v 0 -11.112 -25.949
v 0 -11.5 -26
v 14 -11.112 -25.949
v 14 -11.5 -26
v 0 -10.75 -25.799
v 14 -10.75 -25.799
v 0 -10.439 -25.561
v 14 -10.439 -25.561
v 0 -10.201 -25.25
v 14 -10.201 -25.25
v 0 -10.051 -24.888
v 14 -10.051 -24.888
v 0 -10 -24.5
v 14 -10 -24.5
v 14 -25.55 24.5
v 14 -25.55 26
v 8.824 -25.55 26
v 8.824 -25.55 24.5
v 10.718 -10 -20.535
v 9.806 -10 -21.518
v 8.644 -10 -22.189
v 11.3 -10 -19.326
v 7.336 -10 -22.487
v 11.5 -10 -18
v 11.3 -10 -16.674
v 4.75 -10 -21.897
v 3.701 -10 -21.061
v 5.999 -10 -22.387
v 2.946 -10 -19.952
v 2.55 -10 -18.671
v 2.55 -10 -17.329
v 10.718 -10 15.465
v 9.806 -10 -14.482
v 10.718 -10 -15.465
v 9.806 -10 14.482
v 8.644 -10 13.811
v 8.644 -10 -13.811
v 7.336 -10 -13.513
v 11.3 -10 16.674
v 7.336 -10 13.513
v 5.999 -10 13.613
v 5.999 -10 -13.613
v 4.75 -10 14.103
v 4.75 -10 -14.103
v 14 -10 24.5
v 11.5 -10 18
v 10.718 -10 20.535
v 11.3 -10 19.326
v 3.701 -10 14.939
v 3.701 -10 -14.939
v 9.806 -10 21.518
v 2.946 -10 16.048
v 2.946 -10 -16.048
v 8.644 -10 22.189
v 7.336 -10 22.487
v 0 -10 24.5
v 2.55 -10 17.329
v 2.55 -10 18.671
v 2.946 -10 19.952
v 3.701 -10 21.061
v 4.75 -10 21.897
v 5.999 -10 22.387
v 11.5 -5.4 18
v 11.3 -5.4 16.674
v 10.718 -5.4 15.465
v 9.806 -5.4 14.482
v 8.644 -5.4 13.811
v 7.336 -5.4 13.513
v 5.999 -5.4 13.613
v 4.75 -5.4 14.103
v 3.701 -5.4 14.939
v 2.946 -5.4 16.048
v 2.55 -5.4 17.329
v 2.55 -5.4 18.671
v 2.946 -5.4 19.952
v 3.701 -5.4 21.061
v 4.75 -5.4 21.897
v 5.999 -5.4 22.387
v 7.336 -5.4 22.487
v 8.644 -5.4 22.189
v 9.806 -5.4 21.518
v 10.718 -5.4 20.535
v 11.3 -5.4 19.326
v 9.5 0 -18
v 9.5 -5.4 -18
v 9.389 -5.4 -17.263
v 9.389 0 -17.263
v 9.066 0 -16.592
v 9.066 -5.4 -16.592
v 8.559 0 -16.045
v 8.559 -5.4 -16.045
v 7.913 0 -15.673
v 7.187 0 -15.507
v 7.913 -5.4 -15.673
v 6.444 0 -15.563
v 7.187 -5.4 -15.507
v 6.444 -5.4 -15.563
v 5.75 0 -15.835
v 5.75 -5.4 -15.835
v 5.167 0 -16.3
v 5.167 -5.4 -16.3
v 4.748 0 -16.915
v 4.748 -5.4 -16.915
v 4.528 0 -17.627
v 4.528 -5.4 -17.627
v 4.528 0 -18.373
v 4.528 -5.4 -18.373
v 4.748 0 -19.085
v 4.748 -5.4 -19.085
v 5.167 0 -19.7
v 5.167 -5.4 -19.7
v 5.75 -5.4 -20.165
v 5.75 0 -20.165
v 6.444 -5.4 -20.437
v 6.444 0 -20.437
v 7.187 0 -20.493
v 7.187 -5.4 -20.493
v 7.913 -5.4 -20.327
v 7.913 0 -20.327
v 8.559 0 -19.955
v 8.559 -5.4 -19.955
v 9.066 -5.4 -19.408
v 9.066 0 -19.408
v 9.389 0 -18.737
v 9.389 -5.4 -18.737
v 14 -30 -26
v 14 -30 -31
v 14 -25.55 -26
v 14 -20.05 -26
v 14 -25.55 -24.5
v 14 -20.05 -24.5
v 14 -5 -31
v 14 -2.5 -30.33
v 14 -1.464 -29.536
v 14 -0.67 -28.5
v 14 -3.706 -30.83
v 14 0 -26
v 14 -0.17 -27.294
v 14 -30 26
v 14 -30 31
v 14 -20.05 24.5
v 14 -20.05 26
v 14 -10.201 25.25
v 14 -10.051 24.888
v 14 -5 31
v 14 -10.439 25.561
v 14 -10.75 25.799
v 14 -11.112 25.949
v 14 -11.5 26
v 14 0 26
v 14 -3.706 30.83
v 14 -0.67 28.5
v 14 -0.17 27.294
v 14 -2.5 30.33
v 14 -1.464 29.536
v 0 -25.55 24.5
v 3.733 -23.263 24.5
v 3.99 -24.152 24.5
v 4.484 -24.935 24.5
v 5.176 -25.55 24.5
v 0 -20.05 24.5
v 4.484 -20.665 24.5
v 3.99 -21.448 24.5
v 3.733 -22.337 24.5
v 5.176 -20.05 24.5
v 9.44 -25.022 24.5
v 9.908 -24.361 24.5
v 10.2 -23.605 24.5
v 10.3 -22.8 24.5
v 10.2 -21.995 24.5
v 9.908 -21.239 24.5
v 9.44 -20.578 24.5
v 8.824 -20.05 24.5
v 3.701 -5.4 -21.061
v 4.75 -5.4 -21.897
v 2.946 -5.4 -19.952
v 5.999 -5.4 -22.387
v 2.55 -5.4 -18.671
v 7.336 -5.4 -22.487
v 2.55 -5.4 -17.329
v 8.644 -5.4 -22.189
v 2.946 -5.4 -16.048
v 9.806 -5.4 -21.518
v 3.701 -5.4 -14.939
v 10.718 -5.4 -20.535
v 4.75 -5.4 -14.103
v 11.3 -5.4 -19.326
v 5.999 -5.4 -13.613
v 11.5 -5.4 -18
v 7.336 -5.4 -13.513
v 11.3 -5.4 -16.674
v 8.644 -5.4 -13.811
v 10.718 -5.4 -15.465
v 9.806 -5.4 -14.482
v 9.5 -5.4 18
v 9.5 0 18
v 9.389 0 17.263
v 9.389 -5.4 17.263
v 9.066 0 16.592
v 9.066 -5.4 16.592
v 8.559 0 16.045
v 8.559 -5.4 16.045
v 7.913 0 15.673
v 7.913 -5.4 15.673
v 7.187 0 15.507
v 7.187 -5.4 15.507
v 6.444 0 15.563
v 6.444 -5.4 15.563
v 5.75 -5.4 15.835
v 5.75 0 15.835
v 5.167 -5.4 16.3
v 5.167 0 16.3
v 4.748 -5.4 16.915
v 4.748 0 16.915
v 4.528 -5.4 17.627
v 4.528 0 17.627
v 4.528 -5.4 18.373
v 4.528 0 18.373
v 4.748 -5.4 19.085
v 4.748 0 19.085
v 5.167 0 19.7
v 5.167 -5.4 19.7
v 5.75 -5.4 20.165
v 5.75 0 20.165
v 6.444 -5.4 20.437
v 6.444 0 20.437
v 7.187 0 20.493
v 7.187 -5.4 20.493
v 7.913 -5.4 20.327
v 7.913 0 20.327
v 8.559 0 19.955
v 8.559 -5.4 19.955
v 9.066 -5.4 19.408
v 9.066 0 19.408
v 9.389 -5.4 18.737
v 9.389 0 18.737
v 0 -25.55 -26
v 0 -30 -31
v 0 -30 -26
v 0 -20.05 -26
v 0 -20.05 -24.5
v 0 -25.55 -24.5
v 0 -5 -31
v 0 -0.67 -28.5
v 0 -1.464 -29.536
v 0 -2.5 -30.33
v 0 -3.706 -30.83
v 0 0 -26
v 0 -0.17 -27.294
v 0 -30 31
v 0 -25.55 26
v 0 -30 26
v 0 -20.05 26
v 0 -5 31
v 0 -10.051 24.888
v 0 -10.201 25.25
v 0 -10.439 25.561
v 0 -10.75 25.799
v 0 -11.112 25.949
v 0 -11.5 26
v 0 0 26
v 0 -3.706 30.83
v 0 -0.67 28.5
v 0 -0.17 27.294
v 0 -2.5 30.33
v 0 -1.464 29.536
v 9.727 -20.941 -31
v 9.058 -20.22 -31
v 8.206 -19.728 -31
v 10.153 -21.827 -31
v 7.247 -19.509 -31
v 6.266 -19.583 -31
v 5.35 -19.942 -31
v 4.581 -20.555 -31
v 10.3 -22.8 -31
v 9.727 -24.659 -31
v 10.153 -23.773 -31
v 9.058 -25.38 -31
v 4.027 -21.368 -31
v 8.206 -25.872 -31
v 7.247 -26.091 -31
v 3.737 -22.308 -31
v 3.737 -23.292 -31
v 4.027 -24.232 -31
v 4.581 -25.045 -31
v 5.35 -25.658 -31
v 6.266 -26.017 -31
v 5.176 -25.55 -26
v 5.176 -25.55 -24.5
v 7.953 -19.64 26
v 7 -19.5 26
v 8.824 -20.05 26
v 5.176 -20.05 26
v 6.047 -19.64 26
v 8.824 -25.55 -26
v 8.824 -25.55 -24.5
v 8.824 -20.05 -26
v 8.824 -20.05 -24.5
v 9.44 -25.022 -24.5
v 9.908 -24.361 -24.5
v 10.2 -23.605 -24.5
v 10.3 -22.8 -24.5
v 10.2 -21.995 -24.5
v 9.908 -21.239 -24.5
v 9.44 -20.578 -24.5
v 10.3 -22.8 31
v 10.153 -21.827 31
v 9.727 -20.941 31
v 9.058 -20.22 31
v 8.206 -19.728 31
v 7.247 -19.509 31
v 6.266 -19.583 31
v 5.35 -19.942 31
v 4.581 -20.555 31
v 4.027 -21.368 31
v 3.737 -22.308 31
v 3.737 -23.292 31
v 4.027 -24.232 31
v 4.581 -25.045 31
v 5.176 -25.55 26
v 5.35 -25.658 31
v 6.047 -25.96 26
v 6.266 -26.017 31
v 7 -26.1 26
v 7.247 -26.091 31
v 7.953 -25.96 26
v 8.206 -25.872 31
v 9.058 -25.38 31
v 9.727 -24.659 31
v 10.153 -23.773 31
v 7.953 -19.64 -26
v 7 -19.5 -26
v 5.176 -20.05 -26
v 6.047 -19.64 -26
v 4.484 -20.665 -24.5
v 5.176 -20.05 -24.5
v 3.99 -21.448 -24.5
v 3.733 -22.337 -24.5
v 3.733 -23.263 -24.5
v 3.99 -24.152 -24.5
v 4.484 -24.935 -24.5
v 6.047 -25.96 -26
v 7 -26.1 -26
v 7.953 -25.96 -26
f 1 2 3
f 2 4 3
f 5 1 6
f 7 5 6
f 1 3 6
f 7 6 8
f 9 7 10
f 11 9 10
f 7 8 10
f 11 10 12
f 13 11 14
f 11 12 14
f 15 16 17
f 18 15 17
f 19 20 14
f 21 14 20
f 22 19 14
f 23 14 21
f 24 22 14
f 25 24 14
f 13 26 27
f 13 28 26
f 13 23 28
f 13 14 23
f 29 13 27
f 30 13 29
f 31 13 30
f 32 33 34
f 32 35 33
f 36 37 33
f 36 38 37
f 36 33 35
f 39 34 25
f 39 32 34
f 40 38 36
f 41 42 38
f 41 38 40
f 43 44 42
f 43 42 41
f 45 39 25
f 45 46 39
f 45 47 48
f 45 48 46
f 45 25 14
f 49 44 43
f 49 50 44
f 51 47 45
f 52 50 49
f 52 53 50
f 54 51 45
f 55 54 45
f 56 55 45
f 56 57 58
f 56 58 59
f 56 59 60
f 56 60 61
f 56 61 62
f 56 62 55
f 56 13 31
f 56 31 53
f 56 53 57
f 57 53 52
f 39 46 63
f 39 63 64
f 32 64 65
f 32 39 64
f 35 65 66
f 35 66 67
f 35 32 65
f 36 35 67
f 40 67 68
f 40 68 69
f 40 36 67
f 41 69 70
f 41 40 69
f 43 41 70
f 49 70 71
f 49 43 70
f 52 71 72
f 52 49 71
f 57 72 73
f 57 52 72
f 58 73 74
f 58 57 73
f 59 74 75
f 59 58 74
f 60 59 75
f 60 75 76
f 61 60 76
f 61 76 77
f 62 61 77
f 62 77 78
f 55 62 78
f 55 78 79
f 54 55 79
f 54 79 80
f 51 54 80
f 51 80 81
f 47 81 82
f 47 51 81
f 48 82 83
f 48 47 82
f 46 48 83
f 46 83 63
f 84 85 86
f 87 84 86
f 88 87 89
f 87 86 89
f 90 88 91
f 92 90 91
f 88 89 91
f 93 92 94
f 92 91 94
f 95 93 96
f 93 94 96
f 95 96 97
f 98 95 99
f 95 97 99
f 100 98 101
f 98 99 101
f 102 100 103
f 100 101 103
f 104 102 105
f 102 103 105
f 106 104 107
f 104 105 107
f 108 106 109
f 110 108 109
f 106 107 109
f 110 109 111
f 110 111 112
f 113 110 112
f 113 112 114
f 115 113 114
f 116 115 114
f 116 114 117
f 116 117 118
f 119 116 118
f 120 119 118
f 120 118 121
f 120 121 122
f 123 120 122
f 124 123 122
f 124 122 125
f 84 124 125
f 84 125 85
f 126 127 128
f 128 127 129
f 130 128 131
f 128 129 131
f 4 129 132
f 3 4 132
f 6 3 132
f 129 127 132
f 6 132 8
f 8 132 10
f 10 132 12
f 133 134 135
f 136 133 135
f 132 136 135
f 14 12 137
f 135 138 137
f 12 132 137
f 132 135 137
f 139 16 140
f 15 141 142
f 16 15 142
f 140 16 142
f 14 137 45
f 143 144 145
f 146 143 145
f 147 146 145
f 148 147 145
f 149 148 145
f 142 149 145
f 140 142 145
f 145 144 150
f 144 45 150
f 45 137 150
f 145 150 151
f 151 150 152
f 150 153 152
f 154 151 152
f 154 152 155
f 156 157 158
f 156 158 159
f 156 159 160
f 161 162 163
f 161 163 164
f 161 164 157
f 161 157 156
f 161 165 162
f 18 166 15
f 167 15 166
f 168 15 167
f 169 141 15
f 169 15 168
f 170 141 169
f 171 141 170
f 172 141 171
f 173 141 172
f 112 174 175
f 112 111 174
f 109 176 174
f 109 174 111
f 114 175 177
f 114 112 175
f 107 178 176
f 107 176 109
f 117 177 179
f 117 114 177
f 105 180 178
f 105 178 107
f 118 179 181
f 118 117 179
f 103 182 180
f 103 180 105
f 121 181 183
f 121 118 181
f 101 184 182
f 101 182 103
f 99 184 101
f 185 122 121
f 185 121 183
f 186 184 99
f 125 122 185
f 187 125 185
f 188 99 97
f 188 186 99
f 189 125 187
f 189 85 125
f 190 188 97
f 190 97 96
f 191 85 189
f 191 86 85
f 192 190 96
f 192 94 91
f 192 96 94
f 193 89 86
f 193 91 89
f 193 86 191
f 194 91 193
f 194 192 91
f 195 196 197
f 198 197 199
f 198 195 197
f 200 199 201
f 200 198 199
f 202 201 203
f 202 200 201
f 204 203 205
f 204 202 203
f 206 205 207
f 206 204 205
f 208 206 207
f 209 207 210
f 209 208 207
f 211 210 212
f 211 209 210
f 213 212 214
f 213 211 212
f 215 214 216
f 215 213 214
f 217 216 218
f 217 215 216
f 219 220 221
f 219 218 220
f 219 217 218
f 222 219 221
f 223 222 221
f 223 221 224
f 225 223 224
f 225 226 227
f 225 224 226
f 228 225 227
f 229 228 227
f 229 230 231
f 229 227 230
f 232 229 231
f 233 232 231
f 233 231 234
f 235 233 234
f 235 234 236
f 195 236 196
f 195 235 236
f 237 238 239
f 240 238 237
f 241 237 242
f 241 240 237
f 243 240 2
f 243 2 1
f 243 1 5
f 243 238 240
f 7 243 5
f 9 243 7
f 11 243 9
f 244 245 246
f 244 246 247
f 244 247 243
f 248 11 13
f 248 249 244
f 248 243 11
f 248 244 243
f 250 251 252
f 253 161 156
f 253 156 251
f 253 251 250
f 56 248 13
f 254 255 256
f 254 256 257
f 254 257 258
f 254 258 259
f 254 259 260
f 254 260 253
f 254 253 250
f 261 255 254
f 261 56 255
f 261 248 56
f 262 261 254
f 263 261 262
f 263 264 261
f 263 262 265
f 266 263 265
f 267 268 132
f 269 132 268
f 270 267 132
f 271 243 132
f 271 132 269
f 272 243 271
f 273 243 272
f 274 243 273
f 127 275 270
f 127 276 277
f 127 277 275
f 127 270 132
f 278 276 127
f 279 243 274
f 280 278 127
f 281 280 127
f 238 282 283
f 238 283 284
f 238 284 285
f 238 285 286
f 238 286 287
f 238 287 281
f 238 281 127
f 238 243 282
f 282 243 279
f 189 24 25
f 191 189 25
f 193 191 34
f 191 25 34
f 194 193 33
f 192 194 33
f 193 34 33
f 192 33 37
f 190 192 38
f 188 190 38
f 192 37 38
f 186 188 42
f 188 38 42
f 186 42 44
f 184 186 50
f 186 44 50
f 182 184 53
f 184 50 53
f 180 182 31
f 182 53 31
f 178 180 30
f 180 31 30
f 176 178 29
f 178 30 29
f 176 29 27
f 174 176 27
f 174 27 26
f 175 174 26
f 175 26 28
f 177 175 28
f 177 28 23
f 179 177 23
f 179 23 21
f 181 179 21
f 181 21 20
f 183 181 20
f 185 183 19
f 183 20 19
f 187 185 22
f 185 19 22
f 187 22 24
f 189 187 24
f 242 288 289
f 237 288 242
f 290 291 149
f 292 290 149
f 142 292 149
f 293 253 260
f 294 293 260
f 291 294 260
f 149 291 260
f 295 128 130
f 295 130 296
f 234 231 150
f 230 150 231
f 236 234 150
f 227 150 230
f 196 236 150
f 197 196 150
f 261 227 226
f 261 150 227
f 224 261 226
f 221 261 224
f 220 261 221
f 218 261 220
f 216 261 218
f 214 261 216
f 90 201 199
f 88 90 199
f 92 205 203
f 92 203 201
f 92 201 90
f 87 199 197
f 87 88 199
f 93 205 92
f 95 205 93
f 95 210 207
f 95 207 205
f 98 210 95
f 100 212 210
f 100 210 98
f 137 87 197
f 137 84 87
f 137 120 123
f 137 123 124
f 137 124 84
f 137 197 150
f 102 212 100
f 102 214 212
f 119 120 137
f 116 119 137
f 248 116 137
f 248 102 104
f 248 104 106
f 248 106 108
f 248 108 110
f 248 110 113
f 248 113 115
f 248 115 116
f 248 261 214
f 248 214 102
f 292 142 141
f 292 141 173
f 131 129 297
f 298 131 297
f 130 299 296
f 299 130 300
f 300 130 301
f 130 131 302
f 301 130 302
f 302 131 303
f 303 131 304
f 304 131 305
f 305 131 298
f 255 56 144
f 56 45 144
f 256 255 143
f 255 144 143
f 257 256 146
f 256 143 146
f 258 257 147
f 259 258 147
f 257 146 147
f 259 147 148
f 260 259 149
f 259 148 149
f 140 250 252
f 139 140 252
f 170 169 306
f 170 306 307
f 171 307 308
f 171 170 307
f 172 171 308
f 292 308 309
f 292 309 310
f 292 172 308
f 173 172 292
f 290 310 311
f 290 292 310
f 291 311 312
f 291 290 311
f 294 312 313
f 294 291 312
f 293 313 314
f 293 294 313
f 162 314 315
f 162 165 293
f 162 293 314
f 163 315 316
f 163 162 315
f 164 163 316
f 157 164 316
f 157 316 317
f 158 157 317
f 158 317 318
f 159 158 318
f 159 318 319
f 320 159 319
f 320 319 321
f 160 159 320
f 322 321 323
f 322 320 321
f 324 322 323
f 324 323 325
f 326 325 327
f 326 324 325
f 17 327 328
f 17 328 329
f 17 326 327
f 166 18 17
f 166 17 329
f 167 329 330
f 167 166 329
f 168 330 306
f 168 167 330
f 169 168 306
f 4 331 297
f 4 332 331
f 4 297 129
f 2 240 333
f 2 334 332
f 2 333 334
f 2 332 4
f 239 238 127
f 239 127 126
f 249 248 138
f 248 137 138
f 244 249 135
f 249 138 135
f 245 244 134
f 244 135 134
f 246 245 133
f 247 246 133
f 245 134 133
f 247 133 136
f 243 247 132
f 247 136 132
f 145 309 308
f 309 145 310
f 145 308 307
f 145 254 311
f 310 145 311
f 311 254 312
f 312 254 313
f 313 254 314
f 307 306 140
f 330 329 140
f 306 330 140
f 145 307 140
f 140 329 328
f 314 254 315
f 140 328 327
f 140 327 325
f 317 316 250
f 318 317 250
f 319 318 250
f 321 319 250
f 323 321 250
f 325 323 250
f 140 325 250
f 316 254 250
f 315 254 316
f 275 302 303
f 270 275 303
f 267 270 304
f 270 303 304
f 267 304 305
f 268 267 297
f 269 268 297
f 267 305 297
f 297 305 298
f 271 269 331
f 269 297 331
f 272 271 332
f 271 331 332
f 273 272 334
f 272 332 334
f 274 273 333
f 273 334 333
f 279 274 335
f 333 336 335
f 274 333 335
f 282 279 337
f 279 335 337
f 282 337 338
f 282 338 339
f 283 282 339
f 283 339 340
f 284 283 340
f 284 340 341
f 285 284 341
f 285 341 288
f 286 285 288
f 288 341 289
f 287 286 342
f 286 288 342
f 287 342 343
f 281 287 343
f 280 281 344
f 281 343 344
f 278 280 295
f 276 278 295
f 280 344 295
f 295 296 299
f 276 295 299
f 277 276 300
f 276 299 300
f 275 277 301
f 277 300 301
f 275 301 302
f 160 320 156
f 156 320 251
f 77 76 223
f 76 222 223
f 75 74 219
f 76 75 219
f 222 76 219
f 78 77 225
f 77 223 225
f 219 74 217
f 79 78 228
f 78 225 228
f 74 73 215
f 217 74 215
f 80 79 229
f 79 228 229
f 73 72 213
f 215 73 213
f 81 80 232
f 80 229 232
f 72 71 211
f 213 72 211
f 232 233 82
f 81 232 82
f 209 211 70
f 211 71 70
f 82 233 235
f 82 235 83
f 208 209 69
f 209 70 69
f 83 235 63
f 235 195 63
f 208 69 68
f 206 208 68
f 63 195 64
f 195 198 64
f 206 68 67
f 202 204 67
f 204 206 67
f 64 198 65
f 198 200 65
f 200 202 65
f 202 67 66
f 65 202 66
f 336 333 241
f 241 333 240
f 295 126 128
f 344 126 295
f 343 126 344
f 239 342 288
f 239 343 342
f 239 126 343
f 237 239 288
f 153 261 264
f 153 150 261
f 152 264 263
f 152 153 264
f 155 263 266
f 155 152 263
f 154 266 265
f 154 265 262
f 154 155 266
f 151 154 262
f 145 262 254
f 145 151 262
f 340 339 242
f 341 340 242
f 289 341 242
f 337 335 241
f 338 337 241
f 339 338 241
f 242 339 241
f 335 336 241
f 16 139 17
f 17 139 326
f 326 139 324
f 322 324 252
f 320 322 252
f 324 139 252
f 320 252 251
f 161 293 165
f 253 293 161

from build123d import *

# Parameters (mm, degrees)
BOSS_EXTRUDE1_DEPTH  = 14
SKETCH4_W            = 14
SKETCH4_H            = 5.5
BOSS_EXTRUDE3_DEPTH  = 1.5
CUT_EXTRUDE1_START   = -6.5
SKETCH2_R            = 3.3
CUT_EXTRUDE1_DEPTH   = 6.5
FILLET1_R            = 5
FILLET2_R            = 1.5
SKETCH7_R            = 2.5
CUT_EXTRUDE4_DEPTH   = 11
SKETCH7_3_R          = 4.5
SKETCH7_3_R_2        = 2.5
CUT_EXTRUDE5_DEPTH   = 4.6
FILLET1_OF_MIRROR1_R = 5
FILLET2_OF_MIRROR1_R = 1.5


with BuildPart() as part:
    # Sketch1 → Boss-Extrude1 (new body)
    with BuildSketch(Plane(origin=(0, 0, 0), x_dir=(0, 0, -1), z_dir=(1, 0, 0))):
        Polygon((0, 0), (-31, 0), (-31, -30), (-26, -30), (-26, -10), (0, -10), align=None)
    boss_extrude1 = extrude(amount=BOSS_EXTRUDE1_DEPTH)

    # Sketch4 → Boss-Extrude3 (add)
    with BuildSketch(Plane(origin=(0, 0, 26), x_dir=(-1, 0, 0), z_dir=(0, 0, -1))):
        with Locations((-7, -22.8)):
            Rectangle(SKETCH4_W, SKETCH4_H)
    boss_extrude3 = extrude(amount=BOSS_EXTRUDE3_DEPTH)

    # Sketch2 → Cut-Extrude1 (cut)
    with BuildSketch(Plane.XY.offset(31).offset(CUT_EXTRUDE1_START)):
        with Locations((7, -22.8)):
            Circle(SKETCH2_R)
    cut_extrude1 = extrude(amount=CUT_EXTRUDE1_DEPTH, mode=Mode.SUBTRACT)

    # Fillet1
    fillet1_edges = [part.edges().sort_by_distance(p)[0] for p in [
        (7, 0, 31),
    ]]
    fillet(fillet1_edges, radius=FILLET1_R)

    # Fillet2
    fillet2_edges = [part.edges().sort_by_distance(p)[0] for p in [
        (7, -10, 26),
    ]]
    fillet(fillet2_edges, radius=FILLET2_R)

    # Sketch7 → Cut-Extrude4 (cut, through all)
    with BuildSketch(Plane(origin=(0, -10, 0), x_dir=(1, 0, 0), z_dir=(0, 1, 0))):
        with Locations((7, -18)):
            Circle(SKETCH7_R)
    cut_extrude4 = extrude(amount=CUT_EXTRUDE4_DEPTH, mode=Mode.SUBTRACT)

    # Sketch7<3> → Cut-Extrude5 (cut)
    with BuildSketch(Plane(origin=(0, -10, 0), x_dir=(1, 0, 0), z_dir=(0, 1, 0))):
        with Locations((7, -18)):
            Circle(SKETCH7_3_R)
        with Locations((7, -18)):
            Circle(SKETCH7_3_R_2, mode=Mode.SUBTRACT)
    cut_extrude5 = extrude(amount=CUT_EXTRUDE5_DEPTH, mode=Mode.SUBTRACT)

    # Mirror1: Boss-Extrude1, Boss-Extrude3, Cut-Extrude1, Cut-Extrude4, Cut-Extrude5 across plane
    add(boss_extrude1.mirror(Plane.XY))
    add(boss_extrude3.mirror(Plane.XY))
    add(cut_extrude1.mirror(Plane.XY), mode=Mode.SUBTRACT)
    add(cut_extrude4.mirror(Plane.XY), mode=Mode.SUBTRACT)
    add(cut_extrude5.mirror(Plane.XY), mode=Mode.SUBTRACT)

    # Fillet1 of Mirror1
    fillet1_of_mirror1_edges = [part.edges().sort_by_distance(p)[0] for p in [
        (7, 0, -31),
    ]]
    fillet(fillet1_of_mirror1_edges, radius=FILLET1_OF_MIRROR1_R)

    # Fillet2 of Mirror1
    fillet2_of_mirror1_edges = [part.edges().sort_by_distance(p)[0] for p in [
        (7, -10, -26),
    ]]
    fillet(fillet2_of_mirror1_edges, radius=FILLET2_OF_MIRROR1_R)


solid = part.part
